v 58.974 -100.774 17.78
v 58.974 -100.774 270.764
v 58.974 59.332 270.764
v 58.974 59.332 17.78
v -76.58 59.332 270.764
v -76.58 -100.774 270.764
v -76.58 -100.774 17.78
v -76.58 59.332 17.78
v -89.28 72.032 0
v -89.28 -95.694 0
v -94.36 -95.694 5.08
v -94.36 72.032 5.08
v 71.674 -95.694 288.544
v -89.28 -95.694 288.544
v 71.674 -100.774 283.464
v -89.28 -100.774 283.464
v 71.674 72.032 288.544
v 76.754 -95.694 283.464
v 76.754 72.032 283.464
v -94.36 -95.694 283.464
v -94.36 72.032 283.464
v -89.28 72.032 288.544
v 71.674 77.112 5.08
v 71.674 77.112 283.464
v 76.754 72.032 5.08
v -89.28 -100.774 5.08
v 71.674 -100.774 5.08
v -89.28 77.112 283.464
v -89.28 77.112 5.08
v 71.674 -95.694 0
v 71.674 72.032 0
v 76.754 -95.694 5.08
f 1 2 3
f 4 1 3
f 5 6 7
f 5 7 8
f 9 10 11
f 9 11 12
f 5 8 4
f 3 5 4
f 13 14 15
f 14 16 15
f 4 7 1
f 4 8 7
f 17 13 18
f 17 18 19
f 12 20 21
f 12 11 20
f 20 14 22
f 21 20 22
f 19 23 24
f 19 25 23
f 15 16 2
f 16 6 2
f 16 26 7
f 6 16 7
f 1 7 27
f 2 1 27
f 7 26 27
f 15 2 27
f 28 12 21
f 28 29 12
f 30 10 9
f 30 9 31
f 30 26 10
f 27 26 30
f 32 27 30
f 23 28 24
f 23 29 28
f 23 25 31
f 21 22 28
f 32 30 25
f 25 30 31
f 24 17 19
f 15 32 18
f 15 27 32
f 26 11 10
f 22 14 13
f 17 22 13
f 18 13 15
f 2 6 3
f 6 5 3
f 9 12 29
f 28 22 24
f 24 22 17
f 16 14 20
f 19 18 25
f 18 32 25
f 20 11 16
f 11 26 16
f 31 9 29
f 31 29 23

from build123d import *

# Parameters (mm, degrees)
F0_W     = 171.114452
F0_H     = 177.886084
F1_DEPTH = 288.544
F2_T     = -17.78
F3_SIZE  = 5.08


with BuildPart() as f1:
    # F0 (on Top) → F1 (new body)
    with BuildSketch(Plane.XY):
        with Locations((-8.802969, -11.831455)):
            Rectangle(F0_W, F0_H)
    extrude(amount=F1_DEPTH)

    # F2
    f2_openings = [f1.faces().sort_by_distance(p)[0] for p in [
        (-8.802969, -100.774497, 144.272),
    ]]
    offset(amount=F2_T, openings=f2_openings)

    # F3
    f3_edges = [f1.edges().sort_by_distance(p)[0] for p in [
        (-8.802969, -100.774497, 288.544),
        (76.754257, -11.831455, 288.544),
        (-8.802969, 77.111587, 288.544),
        (-94.360195, -11.831455, 288.544),
        (-94.360195, 77.111587, 144.272),
        (76.754257, 77.111587, 144.272),
        (76.754257, -100.774497, 144.272),
        (-94.360195, -100.774497, 144.272),
        (-94.360195, -11.831455, 0),
        (-8.802969, -100.774497, 0),
        (76.754257, -11.831455, 0),
        (-8.802969, 77.111587, 0),
    ]]
    chamfer(f3_edges, length=F3_SIZE)


solid = f1.part
